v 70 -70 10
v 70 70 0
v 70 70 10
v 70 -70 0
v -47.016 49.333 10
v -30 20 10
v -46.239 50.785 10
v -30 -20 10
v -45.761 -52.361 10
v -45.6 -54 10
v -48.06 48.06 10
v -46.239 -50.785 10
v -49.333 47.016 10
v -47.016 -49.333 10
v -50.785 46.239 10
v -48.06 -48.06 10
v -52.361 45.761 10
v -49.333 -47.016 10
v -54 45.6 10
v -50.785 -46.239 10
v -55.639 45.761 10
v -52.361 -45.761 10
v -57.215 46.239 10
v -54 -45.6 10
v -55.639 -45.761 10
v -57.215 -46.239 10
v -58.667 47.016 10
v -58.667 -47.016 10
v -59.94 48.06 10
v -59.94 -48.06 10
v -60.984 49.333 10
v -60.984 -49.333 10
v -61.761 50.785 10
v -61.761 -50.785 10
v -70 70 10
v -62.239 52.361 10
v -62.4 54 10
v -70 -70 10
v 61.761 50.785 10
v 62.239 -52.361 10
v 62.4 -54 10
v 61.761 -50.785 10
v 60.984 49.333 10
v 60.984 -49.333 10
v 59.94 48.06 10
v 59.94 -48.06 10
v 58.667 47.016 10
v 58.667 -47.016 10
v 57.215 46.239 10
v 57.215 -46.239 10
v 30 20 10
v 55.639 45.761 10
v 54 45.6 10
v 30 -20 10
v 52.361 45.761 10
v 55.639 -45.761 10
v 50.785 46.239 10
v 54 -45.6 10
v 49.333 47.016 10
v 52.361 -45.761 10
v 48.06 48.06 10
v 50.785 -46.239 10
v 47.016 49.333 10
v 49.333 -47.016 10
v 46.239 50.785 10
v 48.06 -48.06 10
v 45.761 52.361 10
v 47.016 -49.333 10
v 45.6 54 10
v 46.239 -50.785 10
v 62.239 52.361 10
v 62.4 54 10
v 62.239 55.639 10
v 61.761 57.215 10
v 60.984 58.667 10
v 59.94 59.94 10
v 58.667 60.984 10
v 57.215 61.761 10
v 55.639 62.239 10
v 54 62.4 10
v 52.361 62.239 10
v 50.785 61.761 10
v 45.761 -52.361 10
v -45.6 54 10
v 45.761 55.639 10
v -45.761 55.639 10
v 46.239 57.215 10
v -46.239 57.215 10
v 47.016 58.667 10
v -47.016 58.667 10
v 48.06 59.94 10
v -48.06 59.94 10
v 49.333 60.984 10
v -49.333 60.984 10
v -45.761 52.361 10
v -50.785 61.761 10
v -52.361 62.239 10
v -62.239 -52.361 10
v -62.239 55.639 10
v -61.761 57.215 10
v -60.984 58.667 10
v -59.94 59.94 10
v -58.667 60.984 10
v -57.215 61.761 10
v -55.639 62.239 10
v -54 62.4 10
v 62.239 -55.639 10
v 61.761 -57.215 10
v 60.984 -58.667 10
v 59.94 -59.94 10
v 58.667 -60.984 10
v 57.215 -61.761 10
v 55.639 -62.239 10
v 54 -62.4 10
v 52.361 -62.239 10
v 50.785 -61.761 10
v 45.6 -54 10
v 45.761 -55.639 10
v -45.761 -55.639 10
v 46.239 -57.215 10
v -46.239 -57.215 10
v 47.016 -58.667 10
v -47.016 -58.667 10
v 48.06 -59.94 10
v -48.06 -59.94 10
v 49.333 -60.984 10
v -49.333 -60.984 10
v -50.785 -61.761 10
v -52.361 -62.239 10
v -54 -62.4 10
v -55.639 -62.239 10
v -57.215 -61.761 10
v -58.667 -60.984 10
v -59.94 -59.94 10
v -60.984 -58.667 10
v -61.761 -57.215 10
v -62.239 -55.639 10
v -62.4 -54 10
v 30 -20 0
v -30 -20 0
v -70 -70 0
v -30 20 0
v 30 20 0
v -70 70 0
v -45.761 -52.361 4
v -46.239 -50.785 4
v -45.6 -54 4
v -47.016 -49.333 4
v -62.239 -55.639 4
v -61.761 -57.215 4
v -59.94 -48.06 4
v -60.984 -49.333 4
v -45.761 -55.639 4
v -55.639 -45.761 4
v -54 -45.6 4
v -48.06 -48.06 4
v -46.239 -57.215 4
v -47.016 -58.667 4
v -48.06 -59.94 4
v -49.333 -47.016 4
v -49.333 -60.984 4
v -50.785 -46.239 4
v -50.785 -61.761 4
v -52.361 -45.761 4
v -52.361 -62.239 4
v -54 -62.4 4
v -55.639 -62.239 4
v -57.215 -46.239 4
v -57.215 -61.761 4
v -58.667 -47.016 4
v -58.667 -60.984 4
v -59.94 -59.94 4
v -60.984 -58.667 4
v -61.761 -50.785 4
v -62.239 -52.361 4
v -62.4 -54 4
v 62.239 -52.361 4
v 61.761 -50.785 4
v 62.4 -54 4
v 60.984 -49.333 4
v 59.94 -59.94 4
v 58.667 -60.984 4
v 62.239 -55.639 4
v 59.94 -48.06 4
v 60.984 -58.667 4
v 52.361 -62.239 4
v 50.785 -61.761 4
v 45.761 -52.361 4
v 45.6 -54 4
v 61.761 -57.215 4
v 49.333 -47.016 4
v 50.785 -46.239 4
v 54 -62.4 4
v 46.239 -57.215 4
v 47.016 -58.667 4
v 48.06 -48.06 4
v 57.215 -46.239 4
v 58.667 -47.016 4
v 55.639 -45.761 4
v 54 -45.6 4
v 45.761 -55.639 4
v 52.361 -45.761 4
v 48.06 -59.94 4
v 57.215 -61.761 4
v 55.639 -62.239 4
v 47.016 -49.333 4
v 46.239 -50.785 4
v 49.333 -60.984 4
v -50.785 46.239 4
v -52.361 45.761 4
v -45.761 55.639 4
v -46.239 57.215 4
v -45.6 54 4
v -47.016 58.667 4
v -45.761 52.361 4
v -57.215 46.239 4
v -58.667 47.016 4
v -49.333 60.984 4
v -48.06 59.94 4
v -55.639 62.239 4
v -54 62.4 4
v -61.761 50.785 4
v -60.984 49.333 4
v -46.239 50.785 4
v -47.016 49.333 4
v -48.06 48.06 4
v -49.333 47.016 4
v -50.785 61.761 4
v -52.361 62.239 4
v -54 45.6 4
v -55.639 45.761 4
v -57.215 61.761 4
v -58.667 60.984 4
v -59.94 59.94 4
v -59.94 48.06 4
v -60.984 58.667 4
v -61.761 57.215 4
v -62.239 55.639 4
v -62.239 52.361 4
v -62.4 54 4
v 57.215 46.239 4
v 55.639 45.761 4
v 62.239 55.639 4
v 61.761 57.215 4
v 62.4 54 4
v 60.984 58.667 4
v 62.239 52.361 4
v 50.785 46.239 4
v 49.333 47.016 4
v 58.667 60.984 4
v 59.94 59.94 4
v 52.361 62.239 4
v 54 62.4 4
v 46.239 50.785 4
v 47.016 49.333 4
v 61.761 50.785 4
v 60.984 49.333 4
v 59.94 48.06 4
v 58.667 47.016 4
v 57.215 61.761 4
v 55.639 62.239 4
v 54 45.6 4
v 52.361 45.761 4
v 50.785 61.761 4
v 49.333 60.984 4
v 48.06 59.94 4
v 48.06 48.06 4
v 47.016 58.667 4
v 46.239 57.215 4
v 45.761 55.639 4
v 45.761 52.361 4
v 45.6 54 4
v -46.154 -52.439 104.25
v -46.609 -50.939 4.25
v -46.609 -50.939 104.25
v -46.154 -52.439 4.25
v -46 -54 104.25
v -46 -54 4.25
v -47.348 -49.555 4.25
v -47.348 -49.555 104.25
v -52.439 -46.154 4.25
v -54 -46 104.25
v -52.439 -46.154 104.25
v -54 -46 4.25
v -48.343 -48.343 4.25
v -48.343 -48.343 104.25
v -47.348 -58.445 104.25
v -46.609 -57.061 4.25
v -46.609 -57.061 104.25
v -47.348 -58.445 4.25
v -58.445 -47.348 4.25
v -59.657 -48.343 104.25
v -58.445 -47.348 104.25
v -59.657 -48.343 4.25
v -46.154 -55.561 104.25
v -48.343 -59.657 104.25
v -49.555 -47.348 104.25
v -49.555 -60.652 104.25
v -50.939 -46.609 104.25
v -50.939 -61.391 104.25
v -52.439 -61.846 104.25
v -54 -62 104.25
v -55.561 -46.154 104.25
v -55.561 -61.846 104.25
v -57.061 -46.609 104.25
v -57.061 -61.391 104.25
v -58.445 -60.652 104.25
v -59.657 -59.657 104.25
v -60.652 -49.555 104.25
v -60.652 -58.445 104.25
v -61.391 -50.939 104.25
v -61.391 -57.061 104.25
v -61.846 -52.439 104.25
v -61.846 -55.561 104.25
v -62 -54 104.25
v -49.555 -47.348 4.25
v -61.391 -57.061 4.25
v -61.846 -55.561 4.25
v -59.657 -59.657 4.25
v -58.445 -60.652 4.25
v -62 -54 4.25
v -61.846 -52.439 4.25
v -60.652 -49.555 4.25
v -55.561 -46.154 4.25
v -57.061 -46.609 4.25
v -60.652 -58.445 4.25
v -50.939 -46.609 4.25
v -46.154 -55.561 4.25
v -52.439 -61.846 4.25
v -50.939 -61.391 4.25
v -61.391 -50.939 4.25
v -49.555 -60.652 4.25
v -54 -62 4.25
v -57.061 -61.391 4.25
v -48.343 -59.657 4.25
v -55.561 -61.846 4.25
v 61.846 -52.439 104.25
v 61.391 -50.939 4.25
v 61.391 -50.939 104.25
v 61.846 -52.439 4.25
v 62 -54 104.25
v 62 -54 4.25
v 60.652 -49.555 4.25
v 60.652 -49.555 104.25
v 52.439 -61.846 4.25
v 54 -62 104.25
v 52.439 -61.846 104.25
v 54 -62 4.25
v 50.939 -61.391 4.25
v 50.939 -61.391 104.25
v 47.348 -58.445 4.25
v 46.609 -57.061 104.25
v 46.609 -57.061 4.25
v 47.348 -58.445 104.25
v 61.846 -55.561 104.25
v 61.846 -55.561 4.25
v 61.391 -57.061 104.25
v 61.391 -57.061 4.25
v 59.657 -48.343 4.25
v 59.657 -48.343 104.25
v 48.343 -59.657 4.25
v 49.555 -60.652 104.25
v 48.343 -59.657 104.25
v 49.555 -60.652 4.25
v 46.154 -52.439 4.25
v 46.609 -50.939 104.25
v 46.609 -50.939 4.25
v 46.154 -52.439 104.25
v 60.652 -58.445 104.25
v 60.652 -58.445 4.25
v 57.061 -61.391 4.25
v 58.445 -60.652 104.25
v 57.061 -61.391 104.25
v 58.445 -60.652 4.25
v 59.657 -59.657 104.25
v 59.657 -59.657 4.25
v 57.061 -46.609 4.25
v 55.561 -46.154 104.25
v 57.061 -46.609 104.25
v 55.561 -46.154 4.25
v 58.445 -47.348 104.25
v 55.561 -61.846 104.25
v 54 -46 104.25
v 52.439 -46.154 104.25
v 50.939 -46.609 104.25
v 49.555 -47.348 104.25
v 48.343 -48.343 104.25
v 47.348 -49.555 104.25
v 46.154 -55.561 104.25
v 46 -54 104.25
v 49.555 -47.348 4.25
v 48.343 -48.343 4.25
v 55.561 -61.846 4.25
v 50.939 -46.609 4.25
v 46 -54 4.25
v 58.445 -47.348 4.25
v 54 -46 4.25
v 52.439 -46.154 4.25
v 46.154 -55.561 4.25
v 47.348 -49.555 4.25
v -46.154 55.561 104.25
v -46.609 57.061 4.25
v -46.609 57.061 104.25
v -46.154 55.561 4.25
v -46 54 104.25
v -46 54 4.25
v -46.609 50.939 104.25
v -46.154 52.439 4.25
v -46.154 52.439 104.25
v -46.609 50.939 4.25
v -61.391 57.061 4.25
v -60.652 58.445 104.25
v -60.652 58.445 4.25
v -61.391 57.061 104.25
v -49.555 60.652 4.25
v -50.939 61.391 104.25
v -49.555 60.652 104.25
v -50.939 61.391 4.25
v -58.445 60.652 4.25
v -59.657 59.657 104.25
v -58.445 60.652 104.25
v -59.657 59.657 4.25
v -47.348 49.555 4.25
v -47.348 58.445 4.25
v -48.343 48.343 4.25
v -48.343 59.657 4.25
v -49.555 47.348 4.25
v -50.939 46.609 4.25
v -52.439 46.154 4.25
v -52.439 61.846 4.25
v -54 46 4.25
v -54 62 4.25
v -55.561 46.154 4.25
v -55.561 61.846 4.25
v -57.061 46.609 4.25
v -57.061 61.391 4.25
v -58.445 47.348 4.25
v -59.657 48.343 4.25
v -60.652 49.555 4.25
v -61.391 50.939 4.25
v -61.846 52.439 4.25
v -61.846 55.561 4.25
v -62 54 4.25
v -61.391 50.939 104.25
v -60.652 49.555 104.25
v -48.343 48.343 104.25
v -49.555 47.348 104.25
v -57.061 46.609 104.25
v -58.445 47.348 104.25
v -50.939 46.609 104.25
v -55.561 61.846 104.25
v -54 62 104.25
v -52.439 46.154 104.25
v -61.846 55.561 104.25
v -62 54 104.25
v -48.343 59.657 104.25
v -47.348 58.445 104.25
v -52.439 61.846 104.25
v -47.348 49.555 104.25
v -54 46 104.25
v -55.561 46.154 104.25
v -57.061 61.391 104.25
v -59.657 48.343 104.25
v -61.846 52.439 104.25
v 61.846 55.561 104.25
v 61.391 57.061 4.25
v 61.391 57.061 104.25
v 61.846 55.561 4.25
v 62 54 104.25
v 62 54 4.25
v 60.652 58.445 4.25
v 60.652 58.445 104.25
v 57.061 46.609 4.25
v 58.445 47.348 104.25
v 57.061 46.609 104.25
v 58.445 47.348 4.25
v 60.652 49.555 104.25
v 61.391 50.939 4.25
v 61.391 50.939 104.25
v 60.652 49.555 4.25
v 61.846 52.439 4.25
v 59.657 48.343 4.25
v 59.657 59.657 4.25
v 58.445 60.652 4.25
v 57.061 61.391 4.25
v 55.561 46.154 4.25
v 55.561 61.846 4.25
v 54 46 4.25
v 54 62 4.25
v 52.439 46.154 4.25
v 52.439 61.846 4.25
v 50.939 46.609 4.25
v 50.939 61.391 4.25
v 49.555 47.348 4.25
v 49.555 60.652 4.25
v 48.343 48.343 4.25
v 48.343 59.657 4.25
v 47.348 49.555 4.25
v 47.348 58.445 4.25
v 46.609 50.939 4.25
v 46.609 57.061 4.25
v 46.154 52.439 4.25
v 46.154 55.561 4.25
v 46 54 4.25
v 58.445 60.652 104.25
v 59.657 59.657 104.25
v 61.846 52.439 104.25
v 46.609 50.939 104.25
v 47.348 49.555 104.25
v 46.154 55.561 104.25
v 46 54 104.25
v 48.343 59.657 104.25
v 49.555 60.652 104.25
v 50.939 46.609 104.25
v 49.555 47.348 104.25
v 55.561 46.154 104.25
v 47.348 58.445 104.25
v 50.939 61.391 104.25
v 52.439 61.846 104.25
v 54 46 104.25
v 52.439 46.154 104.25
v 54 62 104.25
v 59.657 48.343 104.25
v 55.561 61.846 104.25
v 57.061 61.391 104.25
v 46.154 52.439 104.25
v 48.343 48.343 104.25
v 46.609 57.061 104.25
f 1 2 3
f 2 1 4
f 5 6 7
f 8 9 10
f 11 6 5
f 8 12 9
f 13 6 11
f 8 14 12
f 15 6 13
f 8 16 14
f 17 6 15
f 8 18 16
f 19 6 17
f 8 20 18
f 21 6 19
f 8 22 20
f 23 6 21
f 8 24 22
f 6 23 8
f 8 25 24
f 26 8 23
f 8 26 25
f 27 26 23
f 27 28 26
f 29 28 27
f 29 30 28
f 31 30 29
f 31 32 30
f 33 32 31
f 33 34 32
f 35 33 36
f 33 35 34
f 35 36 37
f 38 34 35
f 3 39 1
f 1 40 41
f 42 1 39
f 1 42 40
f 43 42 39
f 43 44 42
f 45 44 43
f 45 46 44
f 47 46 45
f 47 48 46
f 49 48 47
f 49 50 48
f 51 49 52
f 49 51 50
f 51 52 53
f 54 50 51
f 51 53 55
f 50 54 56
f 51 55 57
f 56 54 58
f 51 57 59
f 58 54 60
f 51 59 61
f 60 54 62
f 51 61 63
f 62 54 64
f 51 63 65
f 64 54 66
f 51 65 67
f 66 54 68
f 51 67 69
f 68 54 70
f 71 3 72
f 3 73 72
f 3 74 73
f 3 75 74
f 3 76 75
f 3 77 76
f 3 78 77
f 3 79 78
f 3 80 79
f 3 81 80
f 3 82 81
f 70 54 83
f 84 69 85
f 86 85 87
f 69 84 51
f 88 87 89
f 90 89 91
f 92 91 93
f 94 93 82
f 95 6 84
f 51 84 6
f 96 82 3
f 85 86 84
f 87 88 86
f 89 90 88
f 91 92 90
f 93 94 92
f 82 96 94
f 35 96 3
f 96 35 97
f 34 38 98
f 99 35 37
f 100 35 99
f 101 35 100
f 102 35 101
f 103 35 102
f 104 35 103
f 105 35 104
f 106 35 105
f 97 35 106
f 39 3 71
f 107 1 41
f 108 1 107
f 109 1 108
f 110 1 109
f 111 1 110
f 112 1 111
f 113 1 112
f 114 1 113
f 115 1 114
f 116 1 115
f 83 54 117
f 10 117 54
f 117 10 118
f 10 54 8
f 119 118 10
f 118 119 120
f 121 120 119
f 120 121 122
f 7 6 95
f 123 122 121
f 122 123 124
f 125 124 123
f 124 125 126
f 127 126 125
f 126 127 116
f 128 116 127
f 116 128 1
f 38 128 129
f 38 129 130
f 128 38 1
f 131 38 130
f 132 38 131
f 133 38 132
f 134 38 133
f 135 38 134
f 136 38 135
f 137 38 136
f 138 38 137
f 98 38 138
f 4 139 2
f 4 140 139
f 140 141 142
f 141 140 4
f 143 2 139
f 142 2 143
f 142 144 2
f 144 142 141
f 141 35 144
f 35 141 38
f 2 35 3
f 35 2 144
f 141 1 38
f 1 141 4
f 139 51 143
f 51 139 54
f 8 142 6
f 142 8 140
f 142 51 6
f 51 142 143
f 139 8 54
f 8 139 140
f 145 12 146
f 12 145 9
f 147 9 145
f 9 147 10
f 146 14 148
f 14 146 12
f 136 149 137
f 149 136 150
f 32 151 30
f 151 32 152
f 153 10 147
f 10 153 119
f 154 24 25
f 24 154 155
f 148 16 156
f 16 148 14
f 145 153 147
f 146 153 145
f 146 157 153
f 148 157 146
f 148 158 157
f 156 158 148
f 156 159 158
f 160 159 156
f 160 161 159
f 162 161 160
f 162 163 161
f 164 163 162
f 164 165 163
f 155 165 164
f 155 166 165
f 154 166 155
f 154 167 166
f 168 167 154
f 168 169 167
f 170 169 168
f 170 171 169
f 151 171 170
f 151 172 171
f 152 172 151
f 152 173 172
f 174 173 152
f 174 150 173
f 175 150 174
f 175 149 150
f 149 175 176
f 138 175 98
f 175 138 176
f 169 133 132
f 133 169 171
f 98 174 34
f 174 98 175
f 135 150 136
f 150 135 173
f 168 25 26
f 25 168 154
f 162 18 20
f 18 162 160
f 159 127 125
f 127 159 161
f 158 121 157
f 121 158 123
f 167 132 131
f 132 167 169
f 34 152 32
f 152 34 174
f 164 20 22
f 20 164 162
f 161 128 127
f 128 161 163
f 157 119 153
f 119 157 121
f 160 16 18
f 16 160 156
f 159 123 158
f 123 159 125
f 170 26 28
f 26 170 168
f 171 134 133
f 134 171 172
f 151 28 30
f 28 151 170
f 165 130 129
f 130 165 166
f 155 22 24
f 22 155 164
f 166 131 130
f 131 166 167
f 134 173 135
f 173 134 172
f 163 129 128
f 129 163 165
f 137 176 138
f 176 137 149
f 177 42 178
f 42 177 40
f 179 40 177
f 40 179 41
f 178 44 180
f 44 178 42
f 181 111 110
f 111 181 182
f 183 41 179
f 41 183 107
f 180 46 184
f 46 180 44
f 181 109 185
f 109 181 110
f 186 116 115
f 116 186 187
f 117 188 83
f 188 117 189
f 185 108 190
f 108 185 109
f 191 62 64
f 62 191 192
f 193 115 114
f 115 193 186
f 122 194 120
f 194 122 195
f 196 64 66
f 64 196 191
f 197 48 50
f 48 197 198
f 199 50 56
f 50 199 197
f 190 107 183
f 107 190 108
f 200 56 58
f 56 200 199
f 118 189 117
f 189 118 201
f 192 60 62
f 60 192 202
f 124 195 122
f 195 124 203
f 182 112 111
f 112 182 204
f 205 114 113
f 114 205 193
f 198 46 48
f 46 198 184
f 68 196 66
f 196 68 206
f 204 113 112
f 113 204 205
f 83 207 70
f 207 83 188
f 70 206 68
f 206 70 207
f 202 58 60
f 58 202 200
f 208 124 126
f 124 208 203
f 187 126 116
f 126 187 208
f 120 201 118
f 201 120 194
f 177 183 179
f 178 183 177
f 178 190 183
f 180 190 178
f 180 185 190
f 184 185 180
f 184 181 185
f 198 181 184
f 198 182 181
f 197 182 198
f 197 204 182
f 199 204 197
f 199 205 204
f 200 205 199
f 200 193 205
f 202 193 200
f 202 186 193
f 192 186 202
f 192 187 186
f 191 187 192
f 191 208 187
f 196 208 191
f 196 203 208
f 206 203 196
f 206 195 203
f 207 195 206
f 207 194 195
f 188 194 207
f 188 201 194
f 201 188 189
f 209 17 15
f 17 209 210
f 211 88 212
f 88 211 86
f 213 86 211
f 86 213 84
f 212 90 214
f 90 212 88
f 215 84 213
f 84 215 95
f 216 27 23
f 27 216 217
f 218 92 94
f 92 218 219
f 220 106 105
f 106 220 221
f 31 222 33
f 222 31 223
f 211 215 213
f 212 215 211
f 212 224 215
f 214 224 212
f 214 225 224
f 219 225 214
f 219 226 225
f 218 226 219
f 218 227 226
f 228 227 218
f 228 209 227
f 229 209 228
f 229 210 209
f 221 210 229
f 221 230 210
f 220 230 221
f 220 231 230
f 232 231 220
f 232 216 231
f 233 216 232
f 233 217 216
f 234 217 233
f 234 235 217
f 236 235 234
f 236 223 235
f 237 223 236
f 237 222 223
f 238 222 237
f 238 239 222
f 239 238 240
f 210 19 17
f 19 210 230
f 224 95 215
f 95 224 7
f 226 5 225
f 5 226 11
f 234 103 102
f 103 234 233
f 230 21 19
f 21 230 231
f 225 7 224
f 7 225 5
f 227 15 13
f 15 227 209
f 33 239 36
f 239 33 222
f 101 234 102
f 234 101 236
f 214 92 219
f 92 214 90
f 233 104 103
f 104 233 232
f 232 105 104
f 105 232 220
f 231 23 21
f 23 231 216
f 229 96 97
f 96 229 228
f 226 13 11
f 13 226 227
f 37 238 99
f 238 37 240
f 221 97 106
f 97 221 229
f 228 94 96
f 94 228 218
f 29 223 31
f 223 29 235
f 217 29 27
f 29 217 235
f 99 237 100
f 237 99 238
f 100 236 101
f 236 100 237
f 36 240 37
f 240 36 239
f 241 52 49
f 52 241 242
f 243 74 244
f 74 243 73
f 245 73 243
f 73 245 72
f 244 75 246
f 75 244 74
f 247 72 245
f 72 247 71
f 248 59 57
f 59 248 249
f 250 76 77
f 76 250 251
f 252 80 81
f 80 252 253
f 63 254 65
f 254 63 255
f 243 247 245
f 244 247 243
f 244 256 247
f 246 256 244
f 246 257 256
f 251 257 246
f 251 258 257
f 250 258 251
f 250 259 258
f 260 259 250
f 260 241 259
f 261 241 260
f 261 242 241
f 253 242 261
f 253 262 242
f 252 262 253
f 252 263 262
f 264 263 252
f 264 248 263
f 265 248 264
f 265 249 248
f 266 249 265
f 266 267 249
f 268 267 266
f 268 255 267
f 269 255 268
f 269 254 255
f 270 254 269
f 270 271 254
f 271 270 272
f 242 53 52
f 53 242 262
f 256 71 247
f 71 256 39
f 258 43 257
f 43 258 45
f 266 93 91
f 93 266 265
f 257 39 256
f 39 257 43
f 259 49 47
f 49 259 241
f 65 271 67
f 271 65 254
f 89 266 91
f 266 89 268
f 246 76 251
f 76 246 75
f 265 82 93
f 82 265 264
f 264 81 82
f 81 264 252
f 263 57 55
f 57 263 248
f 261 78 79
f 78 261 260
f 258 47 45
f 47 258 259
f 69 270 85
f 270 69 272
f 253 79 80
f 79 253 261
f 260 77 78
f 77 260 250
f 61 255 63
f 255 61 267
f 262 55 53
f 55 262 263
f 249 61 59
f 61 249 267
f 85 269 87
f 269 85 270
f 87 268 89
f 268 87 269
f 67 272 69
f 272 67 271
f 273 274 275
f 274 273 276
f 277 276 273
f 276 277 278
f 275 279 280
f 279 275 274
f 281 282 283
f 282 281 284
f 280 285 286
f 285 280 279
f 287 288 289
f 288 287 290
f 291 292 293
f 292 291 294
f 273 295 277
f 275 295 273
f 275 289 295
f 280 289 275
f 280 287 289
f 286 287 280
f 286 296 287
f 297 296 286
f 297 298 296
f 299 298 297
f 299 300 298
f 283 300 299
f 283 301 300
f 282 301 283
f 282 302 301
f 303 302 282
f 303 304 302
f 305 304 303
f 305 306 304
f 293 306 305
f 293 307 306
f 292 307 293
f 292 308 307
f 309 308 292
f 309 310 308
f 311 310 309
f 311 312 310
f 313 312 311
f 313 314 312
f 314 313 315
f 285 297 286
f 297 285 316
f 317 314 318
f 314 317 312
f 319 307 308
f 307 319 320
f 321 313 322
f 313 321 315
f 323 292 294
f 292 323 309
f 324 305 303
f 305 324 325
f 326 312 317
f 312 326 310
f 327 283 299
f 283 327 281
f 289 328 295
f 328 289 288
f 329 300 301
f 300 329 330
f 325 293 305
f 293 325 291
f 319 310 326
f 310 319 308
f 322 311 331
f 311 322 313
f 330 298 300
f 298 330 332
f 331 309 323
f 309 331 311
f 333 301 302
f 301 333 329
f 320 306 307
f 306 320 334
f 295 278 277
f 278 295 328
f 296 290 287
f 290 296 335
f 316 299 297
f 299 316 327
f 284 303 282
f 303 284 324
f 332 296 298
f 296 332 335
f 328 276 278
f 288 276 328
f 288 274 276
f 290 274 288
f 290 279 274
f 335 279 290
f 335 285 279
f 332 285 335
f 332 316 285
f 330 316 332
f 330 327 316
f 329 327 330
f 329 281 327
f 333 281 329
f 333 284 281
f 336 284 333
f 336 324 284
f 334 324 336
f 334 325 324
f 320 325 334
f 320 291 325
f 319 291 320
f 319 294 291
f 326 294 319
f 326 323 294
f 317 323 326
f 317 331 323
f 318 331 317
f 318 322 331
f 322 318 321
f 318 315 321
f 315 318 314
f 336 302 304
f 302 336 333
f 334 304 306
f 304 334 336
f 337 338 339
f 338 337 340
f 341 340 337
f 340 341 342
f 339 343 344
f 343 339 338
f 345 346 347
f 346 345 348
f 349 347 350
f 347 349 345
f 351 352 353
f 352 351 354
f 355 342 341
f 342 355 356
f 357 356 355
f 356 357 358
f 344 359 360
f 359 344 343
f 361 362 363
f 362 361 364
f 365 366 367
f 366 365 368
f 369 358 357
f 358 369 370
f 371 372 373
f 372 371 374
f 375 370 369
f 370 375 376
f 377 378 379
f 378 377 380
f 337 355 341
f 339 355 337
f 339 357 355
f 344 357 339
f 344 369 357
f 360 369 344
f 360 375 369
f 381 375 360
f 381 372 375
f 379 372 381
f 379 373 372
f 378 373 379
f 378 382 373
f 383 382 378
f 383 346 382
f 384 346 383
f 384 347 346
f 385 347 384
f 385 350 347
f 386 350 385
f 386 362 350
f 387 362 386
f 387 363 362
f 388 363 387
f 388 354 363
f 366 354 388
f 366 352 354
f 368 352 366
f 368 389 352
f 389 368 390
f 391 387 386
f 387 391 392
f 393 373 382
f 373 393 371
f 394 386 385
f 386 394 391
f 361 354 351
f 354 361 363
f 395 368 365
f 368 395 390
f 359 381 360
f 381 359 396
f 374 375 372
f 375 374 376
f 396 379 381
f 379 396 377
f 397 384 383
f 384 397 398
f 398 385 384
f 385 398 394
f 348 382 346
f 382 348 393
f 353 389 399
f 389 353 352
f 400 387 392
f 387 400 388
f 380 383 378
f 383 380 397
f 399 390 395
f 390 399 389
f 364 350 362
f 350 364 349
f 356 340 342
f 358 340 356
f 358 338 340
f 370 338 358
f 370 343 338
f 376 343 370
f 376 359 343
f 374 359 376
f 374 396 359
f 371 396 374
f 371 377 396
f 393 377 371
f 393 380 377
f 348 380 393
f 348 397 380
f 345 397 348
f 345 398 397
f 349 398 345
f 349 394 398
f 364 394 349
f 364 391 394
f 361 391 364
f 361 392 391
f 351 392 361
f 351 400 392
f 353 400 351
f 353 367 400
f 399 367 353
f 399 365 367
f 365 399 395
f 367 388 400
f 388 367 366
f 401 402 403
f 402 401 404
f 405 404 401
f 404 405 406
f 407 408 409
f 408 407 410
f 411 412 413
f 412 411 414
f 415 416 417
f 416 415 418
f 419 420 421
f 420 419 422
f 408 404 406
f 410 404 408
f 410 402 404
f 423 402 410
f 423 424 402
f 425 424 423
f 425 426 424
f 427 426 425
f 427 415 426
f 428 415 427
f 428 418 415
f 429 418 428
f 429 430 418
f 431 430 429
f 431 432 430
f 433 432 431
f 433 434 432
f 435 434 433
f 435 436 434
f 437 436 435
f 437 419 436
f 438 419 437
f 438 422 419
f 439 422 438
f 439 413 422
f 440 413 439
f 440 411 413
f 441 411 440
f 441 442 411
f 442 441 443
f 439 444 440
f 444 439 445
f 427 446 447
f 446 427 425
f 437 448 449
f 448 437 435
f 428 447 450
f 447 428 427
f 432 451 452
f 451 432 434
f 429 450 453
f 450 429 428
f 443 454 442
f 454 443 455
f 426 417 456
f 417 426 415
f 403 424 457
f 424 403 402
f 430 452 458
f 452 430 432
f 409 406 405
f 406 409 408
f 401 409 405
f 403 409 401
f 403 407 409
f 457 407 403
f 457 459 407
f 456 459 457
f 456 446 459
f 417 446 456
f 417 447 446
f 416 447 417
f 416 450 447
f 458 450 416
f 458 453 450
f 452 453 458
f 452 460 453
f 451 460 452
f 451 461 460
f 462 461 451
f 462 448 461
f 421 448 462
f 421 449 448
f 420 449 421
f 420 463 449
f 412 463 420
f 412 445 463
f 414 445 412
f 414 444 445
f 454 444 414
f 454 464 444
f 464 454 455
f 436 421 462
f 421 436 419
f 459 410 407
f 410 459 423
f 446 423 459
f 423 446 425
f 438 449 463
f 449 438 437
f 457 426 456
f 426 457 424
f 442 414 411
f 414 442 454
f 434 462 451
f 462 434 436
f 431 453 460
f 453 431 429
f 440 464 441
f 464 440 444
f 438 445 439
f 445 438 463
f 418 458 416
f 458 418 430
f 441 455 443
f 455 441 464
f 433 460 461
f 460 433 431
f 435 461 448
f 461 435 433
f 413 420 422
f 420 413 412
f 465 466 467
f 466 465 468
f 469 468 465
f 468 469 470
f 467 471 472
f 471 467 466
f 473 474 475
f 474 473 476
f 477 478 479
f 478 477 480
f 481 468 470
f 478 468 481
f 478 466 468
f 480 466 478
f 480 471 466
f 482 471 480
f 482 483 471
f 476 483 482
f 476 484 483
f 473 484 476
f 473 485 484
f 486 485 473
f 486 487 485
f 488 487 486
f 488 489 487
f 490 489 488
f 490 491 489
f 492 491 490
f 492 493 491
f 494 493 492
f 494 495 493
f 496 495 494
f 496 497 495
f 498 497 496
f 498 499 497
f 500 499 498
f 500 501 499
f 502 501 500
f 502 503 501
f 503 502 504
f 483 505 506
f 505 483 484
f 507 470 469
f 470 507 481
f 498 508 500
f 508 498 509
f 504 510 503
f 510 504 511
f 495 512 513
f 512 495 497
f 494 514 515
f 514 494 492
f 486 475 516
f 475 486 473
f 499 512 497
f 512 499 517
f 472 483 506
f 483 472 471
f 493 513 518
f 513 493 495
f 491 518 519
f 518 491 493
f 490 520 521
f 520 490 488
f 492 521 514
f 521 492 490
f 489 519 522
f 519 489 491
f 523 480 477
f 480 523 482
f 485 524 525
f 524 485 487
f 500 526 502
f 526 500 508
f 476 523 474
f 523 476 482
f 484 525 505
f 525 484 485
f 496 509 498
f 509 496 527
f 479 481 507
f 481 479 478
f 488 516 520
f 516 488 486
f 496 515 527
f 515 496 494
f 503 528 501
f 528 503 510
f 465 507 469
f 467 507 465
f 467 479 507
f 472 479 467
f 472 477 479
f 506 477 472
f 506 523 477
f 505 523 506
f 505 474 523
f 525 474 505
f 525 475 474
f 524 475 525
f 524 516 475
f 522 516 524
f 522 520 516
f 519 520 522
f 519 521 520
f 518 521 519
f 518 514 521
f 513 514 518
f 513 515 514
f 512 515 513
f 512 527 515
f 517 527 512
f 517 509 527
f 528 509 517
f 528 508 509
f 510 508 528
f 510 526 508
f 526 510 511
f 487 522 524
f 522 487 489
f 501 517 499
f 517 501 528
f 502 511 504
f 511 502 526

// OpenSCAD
$fn = 32;

// ------------------------------------------------------------------------
// Frame with four posts: 140 x 140 mm frame, four d16 posts
// Every part is its own module, assembly() places them once.
// ------------------------------------------------------------------------

// --- part 1 ---
module base_frame() {
  difference() {
    translate([-70, -70, 0]) cube([140, 140, 10]);
    translate([-30, -20, -1]) cube([60, 40, 12]);
    translate([-54, -54, 4]) cylinder(h = 7, d = 16.8);
    translate([54, -54, 4]) cylinder(h = 7, d = 16.8);
    translate([-54, 54, 4]) cylinder(h = 7, d = 16.8);
    translate([54, 54, 4]) cylinder(h = 7, d = 16.8);
  }
}

// --- part 2 ---
module post1() {
  cylinder(h = 100, d = 16);
}

// --- part 3 ---
module post2() {
  cylinder(h = 100, d = 16);
}

// --- part 4 ---
module post3() {
  cylinder(h = 100, d = 16);
}

// --- part 5 ---
module post4() {
  cylinder(h = 100, d = 16);
}

// --- assembly ---
module assembly() {
  translate([0, 0, 0]) rotate([0, 0, 0]) base_frame();
  translate([-54, -54, 4.25]) rotate([0, 0, 0]) post1();
  translate([54, -54, 4.25]) rotate([0, 0, 0]) post2();
  translate([-54, 54, 4.25]) rotate([0, 0, 0]) post3();
  translate([54, 54, 4.25]) rotate([0, 0, 0]) post4();
}

assembly();
